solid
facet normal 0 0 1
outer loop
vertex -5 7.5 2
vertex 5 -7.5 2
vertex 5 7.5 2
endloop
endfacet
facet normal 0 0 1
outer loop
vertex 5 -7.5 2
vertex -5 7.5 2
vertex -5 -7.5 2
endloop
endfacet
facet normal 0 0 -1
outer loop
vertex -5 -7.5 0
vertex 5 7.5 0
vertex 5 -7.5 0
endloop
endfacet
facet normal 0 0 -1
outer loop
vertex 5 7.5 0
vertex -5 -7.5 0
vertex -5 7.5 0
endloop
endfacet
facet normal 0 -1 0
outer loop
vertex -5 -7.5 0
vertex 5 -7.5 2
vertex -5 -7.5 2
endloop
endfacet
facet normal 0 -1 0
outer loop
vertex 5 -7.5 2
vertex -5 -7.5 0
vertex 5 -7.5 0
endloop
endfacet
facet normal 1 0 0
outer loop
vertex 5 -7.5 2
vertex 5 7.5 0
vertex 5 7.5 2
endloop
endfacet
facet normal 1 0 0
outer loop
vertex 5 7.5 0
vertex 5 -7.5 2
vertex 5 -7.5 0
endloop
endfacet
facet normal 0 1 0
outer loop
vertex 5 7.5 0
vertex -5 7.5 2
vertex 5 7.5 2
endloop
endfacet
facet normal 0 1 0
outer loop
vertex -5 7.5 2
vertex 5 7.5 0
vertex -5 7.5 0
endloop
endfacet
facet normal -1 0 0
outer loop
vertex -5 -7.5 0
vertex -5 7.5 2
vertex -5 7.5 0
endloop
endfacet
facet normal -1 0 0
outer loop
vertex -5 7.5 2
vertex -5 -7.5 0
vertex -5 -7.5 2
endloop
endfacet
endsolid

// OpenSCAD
// plate 2x3

// external vars #########################

ext_scale = 1.0;
ext_fn = 12;

// part ##################################

module plate_2x3(m_scale=ext_scale,m_fn=ext_fn) {
    scale([m_scale,m_scale,m_scale])
    translate([-5,-7.5,0])
    cube([10,15,2]);
}

plate_2x3();
